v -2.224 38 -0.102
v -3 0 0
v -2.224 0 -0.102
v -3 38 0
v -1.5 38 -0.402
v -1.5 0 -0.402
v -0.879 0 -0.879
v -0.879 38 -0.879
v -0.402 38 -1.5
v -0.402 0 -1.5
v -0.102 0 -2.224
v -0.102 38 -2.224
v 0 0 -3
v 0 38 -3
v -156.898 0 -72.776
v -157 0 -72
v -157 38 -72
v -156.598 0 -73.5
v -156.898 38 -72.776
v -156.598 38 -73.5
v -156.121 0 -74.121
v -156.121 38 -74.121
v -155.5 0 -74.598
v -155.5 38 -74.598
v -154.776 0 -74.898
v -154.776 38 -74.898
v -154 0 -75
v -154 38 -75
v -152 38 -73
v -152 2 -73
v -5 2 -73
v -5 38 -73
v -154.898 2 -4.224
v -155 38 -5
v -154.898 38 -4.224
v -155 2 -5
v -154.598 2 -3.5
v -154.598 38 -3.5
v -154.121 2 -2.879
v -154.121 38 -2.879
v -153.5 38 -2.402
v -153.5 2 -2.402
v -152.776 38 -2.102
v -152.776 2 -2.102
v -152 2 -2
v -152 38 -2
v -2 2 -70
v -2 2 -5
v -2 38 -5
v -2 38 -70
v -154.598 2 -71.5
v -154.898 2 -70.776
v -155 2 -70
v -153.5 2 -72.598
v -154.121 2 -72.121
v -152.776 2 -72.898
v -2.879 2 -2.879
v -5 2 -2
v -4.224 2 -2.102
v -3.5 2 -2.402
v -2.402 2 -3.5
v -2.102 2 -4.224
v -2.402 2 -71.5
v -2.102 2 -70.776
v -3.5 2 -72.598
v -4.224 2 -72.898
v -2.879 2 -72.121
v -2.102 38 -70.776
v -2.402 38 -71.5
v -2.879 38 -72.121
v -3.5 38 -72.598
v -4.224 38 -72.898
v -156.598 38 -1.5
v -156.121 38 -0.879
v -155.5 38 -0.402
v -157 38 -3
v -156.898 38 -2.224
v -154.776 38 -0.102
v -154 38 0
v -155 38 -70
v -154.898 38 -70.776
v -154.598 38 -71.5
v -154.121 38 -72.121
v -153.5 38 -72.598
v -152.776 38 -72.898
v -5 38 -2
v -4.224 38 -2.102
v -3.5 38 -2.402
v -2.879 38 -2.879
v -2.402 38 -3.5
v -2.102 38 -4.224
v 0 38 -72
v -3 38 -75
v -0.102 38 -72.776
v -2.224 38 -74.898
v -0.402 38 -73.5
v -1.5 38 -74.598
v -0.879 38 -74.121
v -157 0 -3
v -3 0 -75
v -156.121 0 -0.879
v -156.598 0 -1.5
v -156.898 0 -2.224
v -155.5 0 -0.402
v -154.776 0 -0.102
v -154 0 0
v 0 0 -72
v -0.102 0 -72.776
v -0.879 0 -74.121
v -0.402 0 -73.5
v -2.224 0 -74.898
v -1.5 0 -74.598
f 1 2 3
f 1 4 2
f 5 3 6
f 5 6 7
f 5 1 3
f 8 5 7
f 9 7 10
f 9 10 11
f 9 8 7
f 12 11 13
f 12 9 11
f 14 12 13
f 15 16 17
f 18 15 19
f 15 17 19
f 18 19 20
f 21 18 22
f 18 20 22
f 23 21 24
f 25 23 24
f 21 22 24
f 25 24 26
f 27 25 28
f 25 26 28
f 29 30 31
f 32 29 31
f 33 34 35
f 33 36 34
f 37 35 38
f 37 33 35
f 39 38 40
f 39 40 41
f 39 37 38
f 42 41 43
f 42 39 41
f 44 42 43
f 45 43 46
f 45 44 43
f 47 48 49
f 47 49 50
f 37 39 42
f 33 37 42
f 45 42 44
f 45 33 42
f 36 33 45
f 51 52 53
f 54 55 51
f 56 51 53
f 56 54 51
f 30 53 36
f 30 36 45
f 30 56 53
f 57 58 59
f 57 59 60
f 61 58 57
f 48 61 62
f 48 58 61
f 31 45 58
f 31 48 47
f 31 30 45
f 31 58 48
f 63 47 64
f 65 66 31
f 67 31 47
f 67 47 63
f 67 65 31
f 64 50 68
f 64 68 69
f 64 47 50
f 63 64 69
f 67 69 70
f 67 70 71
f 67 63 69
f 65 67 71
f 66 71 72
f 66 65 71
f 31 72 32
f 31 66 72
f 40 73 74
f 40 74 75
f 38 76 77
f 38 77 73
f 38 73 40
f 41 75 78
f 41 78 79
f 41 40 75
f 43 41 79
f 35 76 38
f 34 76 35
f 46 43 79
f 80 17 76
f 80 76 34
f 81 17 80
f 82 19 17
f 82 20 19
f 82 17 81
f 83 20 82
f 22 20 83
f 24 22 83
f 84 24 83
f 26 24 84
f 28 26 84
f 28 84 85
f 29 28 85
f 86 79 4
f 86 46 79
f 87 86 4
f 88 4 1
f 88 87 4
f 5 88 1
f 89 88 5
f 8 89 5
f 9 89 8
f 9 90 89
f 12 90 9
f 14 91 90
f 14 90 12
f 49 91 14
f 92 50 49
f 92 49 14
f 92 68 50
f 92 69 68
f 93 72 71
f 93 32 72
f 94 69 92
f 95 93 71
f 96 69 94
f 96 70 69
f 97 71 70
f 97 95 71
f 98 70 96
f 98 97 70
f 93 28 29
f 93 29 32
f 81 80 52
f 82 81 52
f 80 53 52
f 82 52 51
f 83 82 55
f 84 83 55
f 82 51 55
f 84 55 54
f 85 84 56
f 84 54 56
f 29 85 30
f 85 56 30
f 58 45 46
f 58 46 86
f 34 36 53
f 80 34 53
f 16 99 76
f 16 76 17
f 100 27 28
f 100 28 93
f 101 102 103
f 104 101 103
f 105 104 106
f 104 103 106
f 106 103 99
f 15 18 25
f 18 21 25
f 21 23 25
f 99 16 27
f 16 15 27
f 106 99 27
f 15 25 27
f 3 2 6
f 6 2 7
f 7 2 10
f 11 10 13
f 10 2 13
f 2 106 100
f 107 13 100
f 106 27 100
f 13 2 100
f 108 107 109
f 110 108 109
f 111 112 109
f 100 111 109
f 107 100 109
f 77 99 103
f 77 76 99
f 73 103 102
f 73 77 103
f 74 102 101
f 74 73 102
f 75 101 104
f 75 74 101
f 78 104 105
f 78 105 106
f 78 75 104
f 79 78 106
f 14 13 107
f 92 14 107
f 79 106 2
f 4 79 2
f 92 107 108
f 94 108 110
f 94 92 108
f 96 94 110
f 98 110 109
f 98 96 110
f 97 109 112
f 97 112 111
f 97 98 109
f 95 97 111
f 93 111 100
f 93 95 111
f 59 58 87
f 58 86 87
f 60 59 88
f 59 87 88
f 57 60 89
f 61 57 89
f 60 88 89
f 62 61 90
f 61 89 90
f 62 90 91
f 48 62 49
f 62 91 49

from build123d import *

# Parameters (mm, degrees)
SKETCH1_W           = 157
SKETCH1_H           = 75
BOSS_EXTRUDE1_DEPTH = 38
SHELL1_T            = -2
FILLET1_R           = 3


with BuildPart() as part:
    # Sketch1 → Boss-Extrude1 (new body)
    with BuildSketch(Plane(origin=(0, 0, 0), x_dir=(1, 0, 0), z_dir=(0, 1, 0))):
        with Locations((-78.5, 37.5)):
            Rectangle(SKETCH1_W, SKETCH1_H)
    extrude(amount=BOSS_EXTRUDE1_DEPTH)

    # Shell1
    shell1_openings = [part.faces().sort_by_distance(p)[0] for p in [
        (-78.5, 38, -37.5),
    ]]
    offset(amount=SHELL1_T, openings=shell1_openings, kind=Kind.INTERSECTION)

    # Fillet1
    fillet1_edges = [part.edges().sort_by_distance(p)[0] for p in [
        (-2, 20, -2),
        (-2, 20, -73),
        (-155, 20, -73),
        (-155, 20, -2),
        (0, 19, 0),
        (-157, 19, 0),
        (-157, 19, -75),
        (0, 19, -75),
    ]]
    fillet(fillet1_edges, radius=FILLET1_R)


solid = part.part
